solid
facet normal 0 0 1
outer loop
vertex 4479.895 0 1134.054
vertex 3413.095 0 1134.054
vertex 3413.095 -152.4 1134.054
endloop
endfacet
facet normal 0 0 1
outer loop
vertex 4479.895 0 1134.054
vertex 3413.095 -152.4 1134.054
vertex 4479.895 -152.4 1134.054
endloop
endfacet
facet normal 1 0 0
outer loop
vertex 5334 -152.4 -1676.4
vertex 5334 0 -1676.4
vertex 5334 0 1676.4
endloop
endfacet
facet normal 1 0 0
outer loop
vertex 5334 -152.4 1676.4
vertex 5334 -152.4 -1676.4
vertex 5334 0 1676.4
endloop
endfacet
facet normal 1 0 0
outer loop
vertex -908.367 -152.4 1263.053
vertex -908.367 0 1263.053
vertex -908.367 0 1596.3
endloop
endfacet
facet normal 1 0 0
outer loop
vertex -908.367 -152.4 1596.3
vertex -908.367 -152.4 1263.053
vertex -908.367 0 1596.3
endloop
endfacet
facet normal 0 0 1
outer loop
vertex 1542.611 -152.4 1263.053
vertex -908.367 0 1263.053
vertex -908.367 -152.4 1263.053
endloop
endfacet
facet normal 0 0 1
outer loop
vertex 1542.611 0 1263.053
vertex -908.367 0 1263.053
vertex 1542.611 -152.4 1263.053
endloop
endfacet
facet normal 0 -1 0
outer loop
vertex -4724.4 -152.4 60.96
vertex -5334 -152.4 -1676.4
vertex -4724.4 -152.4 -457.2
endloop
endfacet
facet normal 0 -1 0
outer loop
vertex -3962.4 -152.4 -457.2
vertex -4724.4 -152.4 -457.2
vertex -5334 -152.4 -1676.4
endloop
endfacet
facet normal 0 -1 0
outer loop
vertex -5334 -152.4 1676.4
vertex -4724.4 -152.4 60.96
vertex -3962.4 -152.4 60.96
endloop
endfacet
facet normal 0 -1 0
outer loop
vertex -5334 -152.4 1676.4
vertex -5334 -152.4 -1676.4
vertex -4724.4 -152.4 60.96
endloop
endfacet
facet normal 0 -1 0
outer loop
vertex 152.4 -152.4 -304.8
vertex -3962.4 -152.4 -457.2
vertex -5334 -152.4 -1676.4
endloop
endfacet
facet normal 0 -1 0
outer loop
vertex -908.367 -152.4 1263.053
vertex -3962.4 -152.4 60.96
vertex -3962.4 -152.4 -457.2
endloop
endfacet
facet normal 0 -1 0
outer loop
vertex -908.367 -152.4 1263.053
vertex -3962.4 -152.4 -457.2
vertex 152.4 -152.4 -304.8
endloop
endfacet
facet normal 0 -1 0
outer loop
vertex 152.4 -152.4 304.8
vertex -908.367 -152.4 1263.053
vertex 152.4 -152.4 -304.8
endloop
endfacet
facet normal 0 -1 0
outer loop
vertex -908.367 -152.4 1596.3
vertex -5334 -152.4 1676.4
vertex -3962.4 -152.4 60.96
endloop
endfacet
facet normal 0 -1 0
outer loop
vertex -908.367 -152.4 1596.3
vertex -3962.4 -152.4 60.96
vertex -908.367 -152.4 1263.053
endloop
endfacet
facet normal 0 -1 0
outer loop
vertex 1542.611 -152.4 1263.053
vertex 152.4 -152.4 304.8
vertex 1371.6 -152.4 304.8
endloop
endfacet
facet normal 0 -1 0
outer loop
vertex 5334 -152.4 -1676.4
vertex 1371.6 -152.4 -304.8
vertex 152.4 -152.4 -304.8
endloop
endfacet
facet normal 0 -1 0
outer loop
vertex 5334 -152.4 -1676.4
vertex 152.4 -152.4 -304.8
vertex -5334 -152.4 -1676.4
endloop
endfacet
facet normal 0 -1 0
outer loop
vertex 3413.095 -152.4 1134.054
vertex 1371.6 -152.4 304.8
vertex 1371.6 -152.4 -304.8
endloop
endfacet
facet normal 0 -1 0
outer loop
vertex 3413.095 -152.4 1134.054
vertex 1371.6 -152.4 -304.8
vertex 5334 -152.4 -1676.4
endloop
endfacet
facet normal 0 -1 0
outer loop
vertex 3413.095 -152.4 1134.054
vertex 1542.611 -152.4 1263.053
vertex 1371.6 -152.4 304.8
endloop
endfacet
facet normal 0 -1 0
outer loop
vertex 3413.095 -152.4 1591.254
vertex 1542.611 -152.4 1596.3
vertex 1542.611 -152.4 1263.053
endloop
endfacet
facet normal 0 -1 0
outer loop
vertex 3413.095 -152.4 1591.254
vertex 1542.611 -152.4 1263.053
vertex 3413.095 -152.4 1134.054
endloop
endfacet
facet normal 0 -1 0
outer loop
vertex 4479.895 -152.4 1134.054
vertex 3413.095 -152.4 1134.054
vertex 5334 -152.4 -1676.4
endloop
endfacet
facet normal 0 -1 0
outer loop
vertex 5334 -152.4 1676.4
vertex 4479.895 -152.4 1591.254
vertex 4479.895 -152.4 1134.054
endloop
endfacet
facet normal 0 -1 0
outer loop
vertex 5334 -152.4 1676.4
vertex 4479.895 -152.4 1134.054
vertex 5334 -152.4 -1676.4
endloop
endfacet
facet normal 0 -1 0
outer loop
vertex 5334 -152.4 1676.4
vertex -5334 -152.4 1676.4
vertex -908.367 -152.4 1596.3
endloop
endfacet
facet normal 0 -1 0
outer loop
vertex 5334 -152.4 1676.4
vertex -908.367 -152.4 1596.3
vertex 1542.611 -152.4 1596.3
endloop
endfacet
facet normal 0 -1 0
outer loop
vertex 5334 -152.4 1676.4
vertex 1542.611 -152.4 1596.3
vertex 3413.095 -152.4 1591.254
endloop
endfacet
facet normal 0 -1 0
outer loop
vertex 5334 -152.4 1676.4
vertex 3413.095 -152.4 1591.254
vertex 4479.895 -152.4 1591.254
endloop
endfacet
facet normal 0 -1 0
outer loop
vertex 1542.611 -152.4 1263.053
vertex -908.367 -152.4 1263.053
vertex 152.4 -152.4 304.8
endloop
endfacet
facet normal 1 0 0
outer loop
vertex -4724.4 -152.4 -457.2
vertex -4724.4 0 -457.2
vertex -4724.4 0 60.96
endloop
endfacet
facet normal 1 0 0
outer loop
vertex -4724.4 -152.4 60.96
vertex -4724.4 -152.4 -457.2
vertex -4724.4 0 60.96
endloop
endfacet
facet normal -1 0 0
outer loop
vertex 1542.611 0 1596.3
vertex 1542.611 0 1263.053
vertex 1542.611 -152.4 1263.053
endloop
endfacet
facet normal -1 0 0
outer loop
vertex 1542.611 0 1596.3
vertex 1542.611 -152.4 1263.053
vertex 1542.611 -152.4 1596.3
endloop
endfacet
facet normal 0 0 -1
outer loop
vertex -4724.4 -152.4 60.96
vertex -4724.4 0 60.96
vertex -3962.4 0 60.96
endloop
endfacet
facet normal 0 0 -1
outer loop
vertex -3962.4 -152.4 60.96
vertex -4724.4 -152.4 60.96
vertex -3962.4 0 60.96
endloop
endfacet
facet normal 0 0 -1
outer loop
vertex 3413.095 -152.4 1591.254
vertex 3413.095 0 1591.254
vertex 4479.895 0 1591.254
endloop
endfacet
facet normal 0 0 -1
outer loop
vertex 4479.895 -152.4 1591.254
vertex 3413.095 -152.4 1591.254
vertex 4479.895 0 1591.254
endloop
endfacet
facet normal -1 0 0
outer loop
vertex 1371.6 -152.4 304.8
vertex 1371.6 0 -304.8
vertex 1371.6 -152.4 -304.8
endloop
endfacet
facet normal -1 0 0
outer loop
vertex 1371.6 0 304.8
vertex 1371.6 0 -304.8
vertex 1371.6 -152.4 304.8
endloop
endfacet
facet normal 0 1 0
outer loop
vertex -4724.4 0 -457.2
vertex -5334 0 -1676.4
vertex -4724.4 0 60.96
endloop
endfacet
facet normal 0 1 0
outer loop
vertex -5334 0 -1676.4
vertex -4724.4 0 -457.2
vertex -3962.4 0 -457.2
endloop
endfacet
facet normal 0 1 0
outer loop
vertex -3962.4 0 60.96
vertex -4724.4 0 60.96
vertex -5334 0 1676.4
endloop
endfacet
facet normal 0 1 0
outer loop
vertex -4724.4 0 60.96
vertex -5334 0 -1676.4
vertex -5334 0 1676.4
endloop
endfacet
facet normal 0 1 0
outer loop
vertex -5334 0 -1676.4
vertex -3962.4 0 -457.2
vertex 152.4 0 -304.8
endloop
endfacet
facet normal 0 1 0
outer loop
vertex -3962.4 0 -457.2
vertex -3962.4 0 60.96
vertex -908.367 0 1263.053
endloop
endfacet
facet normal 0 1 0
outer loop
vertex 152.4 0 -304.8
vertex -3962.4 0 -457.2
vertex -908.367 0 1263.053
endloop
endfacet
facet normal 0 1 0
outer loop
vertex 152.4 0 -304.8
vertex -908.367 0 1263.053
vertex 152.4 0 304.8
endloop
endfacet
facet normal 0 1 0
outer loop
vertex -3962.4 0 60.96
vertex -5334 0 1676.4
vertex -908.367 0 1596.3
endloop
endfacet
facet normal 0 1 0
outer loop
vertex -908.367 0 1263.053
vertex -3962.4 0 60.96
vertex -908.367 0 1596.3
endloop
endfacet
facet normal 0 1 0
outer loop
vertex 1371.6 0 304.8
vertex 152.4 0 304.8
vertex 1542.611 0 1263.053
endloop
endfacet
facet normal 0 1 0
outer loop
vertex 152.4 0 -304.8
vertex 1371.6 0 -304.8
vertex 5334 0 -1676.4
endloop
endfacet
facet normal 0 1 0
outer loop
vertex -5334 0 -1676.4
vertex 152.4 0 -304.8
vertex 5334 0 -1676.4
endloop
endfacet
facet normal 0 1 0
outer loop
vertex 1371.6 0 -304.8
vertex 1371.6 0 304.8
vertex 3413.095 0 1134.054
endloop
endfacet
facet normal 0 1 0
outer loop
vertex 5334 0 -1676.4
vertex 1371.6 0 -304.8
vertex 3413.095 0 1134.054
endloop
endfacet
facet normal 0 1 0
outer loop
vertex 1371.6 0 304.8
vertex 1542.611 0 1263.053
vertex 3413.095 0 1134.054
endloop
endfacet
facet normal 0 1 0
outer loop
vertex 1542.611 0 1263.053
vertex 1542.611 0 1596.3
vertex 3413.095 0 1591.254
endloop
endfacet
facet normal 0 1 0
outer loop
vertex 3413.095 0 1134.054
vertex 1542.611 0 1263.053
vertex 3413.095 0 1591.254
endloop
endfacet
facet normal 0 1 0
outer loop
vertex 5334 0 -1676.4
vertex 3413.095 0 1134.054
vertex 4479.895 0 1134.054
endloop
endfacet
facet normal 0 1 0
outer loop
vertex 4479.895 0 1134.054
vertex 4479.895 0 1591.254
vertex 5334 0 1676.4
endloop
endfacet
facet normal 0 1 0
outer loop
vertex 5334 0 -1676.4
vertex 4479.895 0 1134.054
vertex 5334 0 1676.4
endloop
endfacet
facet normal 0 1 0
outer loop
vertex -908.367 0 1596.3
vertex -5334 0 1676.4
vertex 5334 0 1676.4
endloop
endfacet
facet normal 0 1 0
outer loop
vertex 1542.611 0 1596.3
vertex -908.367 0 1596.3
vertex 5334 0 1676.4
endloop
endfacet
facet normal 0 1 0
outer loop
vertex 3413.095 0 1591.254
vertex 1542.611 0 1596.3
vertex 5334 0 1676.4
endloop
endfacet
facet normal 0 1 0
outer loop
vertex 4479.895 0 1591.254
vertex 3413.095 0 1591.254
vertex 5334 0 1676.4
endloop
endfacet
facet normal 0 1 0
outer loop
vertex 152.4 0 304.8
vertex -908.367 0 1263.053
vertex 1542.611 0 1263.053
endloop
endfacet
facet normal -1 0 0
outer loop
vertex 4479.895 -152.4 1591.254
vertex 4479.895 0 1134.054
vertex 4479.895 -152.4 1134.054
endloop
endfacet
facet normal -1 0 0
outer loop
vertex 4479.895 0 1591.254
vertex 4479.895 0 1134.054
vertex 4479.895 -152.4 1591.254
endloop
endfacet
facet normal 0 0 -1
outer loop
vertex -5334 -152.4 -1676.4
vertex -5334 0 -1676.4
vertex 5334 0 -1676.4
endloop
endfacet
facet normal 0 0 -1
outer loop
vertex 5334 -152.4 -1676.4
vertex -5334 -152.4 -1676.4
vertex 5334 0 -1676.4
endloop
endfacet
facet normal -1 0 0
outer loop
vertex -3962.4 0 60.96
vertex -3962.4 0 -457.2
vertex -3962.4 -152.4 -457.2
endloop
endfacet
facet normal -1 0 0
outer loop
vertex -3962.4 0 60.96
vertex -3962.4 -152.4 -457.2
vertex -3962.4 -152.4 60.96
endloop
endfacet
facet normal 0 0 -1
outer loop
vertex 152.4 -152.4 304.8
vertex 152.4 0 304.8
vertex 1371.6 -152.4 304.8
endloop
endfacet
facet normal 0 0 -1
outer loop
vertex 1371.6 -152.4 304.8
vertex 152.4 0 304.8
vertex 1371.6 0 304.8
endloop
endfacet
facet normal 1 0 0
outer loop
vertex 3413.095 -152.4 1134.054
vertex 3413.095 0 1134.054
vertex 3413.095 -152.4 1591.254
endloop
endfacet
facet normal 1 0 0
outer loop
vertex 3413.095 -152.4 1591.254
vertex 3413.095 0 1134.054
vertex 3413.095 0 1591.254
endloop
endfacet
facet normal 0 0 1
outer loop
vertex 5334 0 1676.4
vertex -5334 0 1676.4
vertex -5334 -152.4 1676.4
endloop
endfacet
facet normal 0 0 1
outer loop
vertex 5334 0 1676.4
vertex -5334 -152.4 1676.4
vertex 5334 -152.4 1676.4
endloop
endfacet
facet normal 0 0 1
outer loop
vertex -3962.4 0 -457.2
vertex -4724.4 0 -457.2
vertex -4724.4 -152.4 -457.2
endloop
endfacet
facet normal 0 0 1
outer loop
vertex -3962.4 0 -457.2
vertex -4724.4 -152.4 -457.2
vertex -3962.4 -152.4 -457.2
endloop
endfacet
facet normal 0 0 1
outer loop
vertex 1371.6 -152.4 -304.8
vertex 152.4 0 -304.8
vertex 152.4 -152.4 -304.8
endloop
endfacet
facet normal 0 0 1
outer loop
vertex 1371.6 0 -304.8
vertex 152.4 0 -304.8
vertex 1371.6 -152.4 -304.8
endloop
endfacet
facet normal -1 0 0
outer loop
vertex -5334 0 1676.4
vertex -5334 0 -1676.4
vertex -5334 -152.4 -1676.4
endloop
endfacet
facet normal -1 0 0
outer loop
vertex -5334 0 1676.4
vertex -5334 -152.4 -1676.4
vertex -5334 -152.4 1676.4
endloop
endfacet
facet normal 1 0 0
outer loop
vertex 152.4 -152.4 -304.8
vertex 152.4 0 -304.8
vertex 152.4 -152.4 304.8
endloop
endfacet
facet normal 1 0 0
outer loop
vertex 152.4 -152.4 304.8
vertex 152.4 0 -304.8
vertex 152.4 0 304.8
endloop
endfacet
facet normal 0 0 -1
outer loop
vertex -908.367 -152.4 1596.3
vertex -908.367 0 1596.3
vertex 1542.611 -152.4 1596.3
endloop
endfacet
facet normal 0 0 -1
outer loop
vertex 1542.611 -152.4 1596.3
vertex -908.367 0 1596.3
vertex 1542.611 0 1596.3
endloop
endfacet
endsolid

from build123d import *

# Parameters (mm, degrees)
F0_W     = 10668
F0_H     = 3352.8
F0_W_2   = 762
F0_H_2   = 518.16
F0_W_3   = 1219.2
F0_H_3   = 609.6
F0_W_4   = 2450.9781
F0_H_4   = 333.246946
F0_W_5   = 1066.8
F0_H_5   = 457.2
F1_DEPTH = 152.4


with BuildPart() as f1:
    # F0 (on Front) → F1 (new body)
    with BuildSketch(Plane.XZ):
        Rectangle(F0_W, F0_H)
        with Locations((-4343.4, -198.12)):
            Rectangle(F0_W_2, F0_H_2, mode=Mode.SUBTRACT)
        with Locations((762, 0)):
            Rectangle(F0_W_3, F0_H_3, mode=Mode.SUBTRACT)
        with Locations((317.122191, 1429.676175)):
            Rectangle(F0_W_4, F0_H_4, mode=Mode.SUBTRACT)
        with Locations((3946.494521, 1362.653826)):
            Rectangle(F0_W_5, F0_H_5, mode=Mode.SUBTRACT)
    extrude(amount=F1_DEPTH)


solid = f1.part
